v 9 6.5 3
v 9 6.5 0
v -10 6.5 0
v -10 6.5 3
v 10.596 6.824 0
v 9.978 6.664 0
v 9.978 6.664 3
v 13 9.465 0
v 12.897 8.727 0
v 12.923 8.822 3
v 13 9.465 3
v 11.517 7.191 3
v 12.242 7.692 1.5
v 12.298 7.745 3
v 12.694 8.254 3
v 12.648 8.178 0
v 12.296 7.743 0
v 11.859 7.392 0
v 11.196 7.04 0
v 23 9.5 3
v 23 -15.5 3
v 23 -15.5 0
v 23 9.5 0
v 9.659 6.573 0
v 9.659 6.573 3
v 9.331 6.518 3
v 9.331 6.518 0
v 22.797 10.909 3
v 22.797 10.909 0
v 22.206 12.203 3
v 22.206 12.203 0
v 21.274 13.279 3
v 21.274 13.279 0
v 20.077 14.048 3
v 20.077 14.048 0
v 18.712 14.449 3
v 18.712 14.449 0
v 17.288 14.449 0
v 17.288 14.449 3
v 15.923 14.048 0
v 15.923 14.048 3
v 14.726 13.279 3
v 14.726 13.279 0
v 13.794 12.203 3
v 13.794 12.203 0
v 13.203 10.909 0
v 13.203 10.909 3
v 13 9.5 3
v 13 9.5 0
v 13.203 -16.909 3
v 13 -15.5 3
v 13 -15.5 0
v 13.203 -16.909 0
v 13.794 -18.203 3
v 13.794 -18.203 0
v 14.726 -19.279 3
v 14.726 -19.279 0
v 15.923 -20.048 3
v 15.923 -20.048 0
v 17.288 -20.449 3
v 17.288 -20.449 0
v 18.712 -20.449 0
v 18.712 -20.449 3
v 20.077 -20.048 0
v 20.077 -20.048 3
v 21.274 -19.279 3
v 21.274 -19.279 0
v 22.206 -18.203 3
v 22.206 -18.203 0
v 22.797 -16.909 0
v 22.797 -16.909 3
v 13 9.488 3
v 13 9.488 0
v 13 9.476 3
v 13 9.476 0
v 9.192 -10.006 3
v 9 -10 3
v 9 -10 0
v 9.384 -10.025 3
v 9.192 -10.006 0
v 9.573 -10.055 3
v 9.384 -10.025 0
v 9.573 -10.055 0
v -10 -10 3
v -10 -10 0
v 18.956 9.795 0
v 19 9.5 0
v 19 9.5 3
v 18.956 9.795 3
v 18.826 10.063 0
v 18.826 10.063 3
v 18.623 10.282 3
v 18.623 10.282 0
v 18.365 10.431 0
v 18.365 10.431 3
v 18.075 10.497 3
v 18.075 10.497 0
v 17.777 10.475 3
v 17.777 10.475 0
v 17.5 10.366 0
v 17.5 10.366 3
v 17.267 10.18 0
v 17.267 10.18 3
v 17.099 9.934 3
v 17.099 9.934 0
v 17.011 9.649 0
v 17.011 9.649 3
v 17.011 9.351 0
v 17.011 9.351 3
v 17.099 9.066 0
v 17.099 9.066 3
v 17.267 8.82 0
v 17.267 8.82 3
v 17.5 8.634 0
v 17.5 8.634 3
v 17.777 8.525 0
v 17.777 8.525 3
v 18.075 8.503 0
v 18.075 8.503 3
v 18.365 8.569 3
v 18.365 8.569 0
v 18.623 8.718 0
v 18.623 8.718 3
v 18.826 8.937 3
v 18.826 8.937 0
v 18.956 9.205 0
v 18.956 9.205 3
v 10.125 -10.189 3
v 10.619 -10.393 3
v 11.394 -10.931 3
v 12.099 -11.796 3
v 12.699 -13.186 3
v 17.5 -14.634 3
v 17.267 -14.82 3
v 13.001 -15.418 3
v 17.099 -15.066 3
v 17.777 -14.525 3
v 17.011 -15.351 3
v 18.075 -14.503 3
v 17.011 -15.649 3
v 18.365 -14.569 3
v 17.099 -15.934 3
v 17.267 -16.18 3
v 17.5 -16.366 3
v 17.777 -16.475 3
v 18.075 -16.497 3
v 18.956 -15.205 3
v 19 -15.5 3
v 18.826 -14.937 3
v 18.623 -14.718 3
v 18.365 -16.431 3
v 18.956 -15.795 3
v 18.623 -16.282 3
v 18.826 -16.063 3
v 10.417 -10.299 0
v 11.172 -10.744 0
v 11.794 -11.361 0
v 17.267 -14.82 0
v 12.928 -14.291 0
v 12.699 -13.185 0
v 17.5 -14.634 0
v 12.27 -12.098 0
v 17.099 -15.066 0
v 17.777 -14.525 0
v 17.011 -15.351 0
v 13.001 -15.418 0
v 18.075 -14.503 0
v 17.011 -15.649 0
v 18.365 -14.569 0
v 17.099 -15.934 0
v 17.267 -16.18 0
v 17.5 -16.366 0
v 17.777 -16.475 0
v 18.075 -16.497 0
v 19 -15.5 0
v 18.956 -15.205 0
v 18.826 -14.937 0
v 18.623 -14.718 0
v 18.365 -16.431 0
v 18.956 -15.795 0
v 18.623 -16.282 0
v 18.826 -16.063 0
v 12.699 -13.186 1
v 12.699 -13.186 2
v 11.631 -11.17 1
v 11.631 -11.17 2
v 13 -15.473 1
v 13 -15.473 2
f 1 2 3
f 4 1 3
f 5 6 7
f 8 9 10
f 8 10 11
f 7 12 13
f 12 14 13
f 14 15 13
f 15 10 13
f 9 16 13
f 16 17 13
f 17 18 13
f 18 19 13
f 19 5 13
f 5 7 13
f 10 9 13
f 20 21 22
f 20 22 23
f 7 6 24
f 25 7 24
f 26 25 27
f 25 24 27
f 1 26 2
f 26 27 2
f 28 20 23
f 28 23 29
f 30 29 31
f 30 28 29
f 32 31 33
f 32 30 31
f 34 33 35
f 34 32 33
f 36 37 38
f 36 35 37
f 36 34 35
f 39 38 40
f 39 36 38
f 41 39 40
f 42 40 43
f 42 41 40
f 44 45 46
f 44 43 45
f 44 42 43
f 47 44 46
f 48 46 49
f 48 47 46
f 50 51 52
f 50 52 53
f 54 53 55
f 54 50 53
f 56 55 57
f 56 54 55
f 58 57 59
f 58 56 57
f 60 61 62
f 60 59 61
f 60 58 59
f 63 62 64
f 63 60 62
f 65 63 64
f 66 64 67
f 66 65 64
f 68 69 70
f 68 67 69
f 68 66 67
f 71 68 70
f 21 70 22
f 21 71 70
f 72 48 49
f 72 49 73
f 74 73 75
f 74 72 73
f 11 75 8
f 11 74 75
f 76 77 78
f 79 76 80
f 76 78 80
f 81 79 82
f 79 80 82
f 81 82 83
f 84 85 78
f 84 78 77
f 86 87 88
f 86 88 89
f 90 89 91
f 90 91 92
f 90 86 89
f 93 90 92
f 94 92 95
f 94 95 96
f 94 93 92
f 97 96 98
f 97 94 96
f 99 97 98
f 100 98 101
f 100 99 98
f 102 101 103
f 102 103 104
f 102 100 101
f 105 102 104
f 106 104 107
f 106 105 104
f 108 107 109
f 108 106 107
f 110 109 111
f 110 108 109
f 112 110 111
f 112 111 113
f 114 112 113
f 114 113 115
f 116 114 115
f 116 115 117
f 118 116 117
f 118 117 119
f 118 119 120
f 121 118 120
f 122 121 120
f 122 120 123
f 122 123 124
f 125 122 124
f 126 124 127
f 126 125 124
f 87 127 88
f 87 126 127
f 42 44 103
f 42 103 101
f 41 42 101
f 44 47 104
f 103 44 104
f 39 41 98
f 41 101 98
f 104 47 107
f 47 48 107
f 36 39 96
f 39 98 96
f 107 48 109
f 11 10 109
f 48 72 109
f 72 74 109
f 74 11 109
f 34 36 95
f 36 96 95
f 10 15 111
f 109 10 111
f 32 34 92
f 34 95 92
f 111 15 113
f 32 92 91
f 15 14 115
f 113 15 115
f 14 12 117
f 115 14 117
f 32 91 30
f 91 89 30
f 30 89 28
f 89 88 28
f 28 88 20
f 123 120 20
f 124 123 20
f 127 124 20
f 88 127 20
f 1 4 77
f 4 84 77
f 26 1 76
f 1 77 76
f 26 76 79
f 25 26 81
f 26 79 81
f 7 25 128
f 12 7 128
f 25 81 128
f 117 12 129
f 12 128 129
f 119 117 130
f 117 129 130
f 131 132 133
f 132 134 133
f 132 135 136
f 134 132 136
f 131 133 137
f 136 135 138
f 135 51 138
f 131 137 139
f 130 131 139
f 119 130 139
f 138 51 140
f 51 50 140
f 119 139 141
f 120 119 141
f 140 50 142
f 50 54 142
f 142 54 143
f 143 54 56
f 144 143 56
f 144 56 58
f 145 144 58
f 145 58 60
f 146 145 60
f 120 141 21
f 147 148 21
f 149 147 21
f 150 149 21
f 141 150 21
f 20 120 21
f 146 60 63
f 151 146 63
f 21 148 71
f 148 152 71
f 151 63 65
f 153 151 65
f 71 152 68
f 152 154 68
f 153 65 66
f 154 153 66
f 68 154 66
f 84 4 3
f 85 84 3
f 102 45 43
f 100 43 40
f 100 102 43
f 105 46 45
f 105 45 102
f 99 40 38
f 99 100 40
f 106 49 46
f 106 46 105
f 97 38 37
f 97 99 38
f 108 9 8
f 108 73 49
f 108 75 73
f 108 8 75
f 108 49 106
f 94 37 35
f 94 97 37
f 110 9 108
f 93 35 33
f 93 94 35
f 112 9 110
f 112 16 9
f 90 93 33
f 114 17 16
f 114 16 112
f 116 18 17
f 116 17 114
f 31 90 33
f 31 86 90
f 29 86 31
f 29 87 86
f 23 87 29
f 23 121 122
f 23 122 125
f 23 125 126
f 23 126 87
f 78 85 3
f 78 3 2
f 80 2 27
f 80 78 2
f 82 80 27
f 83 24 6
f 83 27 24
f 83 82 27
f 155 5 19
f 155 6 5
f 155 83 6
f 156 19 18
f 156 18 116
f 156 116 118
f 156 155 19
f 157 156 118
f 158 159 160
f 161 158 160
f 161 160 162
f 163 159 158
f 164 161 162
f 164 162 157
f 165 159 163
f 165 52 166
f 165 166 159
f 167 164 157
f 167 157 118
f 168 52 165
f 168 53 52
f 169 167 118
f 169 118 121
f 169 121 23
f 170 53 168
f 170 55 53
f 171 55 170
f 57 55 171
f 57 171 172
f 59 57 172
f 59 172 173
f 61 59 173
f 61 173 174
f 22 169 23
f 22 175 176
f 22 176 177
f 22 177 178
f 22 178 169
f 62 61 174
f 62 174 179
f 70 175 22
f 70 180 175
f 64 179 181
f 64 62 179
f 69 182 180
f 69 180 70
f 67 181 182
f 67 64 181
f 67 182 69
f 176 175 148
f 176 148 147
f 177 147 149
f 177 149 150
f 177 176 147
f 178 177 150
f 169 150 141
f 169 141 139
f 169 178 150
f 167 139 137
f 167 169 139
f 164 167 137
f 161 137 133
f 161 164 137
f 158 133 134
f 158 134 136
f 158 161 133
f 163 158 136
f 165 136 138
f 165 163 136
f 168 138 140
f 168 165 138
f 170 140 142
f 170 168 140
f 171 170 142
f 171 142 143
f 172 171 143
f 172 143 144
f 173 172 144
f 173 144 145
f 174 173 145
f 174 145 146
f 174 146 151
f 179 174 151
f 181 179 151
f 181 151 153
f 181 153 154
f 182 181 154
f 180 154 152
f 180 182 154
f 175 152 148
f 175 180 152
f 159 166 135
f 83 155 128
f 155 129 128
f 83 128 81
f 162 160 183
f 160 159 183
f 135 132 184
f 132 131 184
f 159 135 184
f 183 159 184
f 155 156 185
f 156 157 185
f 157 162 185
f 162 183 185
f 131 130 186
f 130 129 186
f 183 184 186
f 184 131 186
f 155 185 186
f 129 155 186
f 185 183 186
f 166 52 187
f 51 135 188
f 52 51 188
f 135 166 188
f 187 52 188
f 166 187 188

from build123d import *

# Parameters (mm, degrees)
SKETCH1_R           = 1
BOSS_EXTRUDE1_DEPTH = 3
SKETCH5_OUTSIDE_W   = 34.508
SKETCH5_OUTSIDE_H   = 45.508
SKETCH5_OUTSIDE_R   = 1
CUT_EXTRUDE2_DEPTH  = 10
SKETCH7_W           = 3
SKETCH7_H           = 10
SKETCH7_H_2         = 4
BOSS_EXTRUDE2_DEPTH = 10
BOSS_EXTRUDE3_REACH = 32.956
SKETCH8_W           = 22
SKETCH8_H           = 3


with BuildPart() as part:
    # Sketch1 → Boss-Extrude1 (new body)
    with BuildSketch(Plane.XY):
        with BuildLine():
            Line((0, 0), (0, -10))
            Line((0, -10), (9, -10))
            ThreePointArc((9, -10), (11.121320344, -10.878679656), (12, -13))
            Line((12, -13), (12, -17.5))
            ThreePointArc((12, -17.5), (12.878679656, -19.621320344), (15, -20.5))
            Line((15, -20.5), (21, -20.5))
            ThreePointArc((21, -20.5), (23.121320344, -19.621320344), (24, -17.5))
            Line((24, -17.5), (24, 11.5))
            ThreePointArc((24, 11.5), (23.121320344, 13.621320344), (21, 14.5))
            Line((21, 14.5), (15, 14.5))
            ThreePointArc((15, 14.5), (12.878679656, 13.621320344), (12, 11.5))
            Line((12, 11.5), (12, 9.5))
            ThreePointArc((12, 9.5), (11.121320344, 7.378679656), (9, 6.5))
            Line((9, 6.5), (0, 6.5))
            Line((0, 6.5), (0, 2.5))
            Line((0, 2.5), (12, 2.5))
            Line((12, 2.5), (12, 0))
            Line((12, 0), (0, 0))
        make_face()
        with Locations((18, -15.5)):
            Circle(SKETCH1_R, mode=Mode.SUBTRACT)
        with Locations((18, 9.5)):
            Circle(SKETCH1_R, mode=Mode.SUBTRACT)
    extrude(amount=BOSS_EXTRUDE1_DEPTH)

    # Sketch5 outside → Cut-Extrude2 (cut)
    # profile 1 of 3: a face of its own
    with BuildSketch(Plane.XY.offset(3)):
        with Locations((12, -3)):
            Rectangle(SKETCH5_OUTSIDE_W, SKETCH5_OUTSIDE_H)
        with BuildLine():
            Line((23, -15.5), (23, 9.5))
            ThreePointArc((23, 9.5), (18, 14.5), (13, 9.5))
            ThreePointArc((13, 9.5), (13.00003125, 9.482322297), (13.000125, 9.464644815))
            add(Edge.make_bspline(
                [(9.978094602, 6.663923317), (12.995350289, 7.319865218), (13.000125, 9.464644815)],
                knots=[0.130065152, 0.130065152, 0.130065152, 0.992908545, 0.992908545, 0.992908545], degree=2))
            ThreePointArc((9.978094602, 6.663923317), (9.495867902, 6.541264624), (9, 6.5))
            Line((9, 6.5), (0, 6.5))
            Line((0, 6.5), (0, 2.5))
            Line((0, 2.5), (12, 2.5))
            Line((12, 2.5), (12, 0))
            Line((12, 0), (0, 0))
            Line((0, 0), (0, -10))
            Line((0, -10), (9, -10))
            ThreePointArc((9, -10), (9.288075976, -10.013863327), (9.573489492, -10.055325179))
            add(Edge.make_bspline(
                [(13.000670773, -15.418101992), (13.007397522, -13.305169489), (12.200422908, -10.491068866), (9.573489492, -10.055325179)],
                knots=[0.011989502, 0.011989502, 0.011989502, 0.011989502, 0.935888971, 0.935888971, 0.935888971, 0.935888971], degree=3))
            add(Edge.make_bspline(
                [(13, -15.5), (13.000359156, -15.47282323), (13.00058348, -15.445521651), (13.000670773, -15.418101992)],
                knots=[0, 0, 0, 0, 0.011989502, 0.011989502, 0.011989502, 0.011989502], degree=3))
            ThreePointArc((13, -15.5), (18, -20.5), (23, -15.5))
        make_face(mode=Mode.SUBTRACT)
    # profile 2 of 3: a face of its own
    with BuildSketch(Plane.XY.offset(3)):
        with Locations((18, -15.5)):
            Circle(SKETCH5_OUTSIDE_R)
    # profile 3 of 3: a face of its own
    with BuildSketch(Plane.XY.offset(3)):
        with Locations((18, 9.5)):
            Circle(SKETCH5_OUTSIDE_R)
    extrude(amount=-CUT_EXTRUDE2_DEPTH, mode=Mode.SUBTRACT)

    # Sketch7 → Boss-Extrude2 (add)
    with BuildSketch(Plane.ZY):
        with Locations((1.5, -5)):
            Rectangle(SKETCH7_W, SKETCH7_H)
        with Locations((1.5, 4.5)):
            Rectangle(SKETCH7_W, SKETCH7_H_2)
    extrude(amount=BOSS_EXTRUDE2_DEPTH)

    # Sketch8 → Boss-Extrude3 (add, up to next)
    with BuildSketch(Plane(origin=(0, 0, 0), x_dir=(1, 0, 0), z_dir=(0, 1, 0)), mode=Mode.PRIVATE) as boss_extrude3_sk1:
        with Locations((1, -1.5)):
            Rectangle(SKETCH8_W, SKETCH8_H)
    boss_extrude3_tool1 = extrude(boss_extrude3_sk1.sketch, amount=BOSS_EXTRUDE3_REACH, mode=Mode.PRIVATE) - part.part
    add(boss_extrude3_tool1.solids().sort_by_distance((1, 0, 1.5))[0])


solid = part.part
